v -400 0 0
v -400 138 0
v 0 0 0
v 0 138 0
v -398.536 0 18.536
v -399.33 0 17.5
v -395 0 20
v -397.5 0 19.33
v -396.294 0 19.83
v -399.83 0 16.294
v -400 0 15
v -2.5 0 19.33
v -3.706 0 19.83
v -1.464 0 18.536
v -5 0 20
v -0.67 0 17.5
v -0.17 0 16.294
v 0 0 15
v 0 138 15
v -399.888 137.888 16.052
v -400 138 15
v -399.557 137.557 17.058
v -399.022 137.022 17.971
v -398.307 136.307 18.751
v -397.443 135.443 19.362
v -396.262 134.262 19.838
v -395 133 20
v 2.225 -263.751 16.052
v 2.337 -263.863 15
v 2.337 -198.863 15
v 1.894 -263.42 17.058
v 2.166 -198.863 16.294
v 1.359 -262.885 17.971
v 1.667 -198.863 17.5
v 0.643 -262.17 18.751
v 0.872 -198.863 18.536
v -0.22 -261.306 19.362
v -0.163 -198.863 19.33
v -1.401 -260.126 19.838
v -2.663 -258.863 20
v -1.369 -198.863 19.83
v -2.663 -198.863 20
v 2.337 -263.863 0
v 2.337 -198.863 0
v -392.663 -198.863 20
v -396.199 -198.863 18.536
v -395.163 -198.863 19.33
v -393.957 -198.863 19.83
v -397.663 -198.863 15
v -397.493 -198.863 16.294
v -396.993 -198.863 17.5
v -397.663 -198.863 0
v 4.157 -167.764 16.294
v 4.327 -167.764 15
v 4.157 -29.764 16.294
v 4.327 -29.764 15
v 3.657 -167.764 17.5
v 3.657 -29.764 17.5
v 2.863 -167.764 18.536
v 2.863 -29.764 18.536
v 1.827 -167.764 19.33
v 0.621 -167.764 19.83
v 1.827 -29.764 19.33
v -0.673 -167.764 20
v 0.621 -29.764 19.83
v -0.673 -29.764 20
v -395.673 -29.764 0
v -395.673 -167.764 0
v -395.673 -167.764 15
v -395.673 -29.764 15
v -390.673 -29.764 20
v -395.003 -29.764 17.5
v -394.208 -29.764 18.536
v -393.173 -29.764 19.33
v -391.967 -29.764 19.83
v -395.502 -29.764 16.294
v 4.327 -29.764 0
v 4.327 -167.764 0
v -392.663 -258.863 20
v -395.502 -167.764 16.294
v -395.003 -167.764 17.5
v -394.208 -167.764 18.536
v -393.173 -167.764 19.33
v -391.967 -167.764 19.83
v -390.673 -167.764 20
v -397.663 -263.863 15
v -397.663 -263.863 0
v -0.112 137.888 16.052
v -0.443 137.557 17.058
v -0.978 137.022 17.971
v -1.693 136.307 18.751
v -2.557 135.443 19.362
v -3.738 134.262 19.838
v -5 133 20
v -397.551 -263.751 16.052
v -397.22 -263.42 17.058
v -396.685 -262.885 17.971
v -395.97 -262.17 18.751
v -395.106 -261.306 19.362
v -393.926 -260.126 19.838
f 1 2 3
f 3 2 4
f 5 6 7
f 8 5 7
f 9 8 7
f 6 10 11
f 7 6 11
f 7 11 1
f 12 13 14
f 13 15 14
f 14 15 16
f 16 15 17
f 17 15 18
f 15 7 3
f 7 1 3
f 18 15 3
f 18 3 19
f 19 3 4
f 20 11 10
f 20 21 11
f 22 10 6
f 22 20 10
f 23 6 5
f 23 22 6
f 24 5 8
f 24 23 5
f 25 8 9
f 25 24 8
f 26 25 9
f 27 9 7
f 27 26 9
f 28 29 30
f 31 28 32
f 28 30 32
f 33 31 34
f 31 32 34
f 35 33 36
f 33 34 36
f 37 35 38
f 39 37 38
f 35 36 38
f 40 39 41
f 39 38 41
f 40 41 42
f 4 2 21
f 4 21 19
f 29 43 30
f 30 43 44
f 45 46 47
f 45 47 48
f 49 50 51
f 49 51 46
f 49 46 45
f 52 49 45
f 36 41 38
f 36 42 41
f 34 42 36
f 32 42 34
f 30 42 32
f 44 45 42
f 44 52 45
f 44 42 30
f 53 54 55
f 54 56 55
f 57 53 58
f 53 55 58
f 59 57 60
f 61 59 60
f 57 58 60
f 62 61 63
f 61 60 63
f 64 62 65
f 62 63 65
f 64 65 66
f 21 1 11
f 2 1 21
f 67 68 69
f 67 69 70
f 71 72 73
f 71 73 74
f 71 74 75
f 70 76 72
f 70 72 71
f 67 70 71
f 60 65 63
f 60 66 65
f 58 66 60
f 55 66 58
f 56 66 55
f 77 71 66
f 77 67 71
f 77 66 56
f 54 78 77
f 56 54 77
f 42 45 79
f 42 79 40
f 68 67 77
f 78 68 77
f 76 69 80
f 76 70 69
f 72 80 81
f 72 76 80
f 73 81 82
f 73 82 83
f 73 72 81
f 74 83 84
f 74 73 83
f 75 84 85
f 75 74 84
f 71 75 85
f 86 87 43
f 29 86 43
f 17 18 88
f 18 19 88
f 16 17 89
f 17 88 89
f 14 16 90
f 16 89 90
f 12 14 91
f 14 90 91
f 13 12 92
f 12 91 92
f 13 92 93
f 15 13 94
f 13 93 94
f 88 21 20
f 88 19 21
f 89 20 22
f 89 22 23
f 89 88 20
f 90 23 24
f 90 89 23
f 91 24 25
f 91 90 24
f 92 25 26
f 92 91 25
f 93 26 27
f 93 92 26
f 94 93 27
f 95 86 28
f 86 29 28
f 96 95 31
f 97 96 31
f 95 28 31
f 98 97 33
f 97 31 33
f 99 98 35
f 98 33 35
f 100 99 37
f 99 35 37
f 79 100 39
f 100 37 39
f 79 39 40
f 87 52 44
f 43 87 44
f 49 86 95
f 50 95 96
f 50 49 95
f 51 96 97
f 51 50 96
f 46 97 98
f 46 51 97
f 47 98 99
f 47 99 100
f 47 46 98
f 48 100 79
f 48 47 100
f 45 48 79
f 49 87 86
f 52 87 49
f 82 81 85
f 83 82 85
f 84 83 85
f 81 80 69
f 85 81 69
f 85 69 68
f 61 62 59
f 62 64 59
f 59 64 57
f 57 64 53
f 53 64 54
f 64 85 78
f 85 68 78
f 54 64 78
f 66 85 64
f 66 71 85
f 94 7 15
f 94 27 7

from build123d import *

# Parameters (mm, degrees)
F0_W     = 400
F0_H     = 138
F0_H_2   = 65
F1_DEPTH = 20
F2_R     = 5


with BuildPart() as f1:
    # F0 (on Top) → F1 (new body)
    with BuildSketch(Plane.XY):
        with Locations((-200, 69)):
            Rectangle(F0_W, F0_H)
        with Locations((-195.672709, -98.763943)):
            Rectangle(F0_W, F0_H)
        with Locations((-197.663327, -231.363236)):
            Rectangle(F0_W, F0_H_2)
    extrude(amount=F1_DEPTH)

    # F2
    f2_edges = [f1.edges().sort_by_distance(p)[0] for p in [
        (-397.663327, -231.363236, 20),
        (2.336673, -231.363236, 20),
        (-197.663327, -263.863236, 20),
        (-395.672709, -98.763943, 20),
        (4.327291, -98.763943, 20),
        (0, 69, 20),
        (-400, 69, 20),
        (-200, 138, 20),
    ]]
    fillet(f2_edges, radius=F2_R)


solid = f1.part
